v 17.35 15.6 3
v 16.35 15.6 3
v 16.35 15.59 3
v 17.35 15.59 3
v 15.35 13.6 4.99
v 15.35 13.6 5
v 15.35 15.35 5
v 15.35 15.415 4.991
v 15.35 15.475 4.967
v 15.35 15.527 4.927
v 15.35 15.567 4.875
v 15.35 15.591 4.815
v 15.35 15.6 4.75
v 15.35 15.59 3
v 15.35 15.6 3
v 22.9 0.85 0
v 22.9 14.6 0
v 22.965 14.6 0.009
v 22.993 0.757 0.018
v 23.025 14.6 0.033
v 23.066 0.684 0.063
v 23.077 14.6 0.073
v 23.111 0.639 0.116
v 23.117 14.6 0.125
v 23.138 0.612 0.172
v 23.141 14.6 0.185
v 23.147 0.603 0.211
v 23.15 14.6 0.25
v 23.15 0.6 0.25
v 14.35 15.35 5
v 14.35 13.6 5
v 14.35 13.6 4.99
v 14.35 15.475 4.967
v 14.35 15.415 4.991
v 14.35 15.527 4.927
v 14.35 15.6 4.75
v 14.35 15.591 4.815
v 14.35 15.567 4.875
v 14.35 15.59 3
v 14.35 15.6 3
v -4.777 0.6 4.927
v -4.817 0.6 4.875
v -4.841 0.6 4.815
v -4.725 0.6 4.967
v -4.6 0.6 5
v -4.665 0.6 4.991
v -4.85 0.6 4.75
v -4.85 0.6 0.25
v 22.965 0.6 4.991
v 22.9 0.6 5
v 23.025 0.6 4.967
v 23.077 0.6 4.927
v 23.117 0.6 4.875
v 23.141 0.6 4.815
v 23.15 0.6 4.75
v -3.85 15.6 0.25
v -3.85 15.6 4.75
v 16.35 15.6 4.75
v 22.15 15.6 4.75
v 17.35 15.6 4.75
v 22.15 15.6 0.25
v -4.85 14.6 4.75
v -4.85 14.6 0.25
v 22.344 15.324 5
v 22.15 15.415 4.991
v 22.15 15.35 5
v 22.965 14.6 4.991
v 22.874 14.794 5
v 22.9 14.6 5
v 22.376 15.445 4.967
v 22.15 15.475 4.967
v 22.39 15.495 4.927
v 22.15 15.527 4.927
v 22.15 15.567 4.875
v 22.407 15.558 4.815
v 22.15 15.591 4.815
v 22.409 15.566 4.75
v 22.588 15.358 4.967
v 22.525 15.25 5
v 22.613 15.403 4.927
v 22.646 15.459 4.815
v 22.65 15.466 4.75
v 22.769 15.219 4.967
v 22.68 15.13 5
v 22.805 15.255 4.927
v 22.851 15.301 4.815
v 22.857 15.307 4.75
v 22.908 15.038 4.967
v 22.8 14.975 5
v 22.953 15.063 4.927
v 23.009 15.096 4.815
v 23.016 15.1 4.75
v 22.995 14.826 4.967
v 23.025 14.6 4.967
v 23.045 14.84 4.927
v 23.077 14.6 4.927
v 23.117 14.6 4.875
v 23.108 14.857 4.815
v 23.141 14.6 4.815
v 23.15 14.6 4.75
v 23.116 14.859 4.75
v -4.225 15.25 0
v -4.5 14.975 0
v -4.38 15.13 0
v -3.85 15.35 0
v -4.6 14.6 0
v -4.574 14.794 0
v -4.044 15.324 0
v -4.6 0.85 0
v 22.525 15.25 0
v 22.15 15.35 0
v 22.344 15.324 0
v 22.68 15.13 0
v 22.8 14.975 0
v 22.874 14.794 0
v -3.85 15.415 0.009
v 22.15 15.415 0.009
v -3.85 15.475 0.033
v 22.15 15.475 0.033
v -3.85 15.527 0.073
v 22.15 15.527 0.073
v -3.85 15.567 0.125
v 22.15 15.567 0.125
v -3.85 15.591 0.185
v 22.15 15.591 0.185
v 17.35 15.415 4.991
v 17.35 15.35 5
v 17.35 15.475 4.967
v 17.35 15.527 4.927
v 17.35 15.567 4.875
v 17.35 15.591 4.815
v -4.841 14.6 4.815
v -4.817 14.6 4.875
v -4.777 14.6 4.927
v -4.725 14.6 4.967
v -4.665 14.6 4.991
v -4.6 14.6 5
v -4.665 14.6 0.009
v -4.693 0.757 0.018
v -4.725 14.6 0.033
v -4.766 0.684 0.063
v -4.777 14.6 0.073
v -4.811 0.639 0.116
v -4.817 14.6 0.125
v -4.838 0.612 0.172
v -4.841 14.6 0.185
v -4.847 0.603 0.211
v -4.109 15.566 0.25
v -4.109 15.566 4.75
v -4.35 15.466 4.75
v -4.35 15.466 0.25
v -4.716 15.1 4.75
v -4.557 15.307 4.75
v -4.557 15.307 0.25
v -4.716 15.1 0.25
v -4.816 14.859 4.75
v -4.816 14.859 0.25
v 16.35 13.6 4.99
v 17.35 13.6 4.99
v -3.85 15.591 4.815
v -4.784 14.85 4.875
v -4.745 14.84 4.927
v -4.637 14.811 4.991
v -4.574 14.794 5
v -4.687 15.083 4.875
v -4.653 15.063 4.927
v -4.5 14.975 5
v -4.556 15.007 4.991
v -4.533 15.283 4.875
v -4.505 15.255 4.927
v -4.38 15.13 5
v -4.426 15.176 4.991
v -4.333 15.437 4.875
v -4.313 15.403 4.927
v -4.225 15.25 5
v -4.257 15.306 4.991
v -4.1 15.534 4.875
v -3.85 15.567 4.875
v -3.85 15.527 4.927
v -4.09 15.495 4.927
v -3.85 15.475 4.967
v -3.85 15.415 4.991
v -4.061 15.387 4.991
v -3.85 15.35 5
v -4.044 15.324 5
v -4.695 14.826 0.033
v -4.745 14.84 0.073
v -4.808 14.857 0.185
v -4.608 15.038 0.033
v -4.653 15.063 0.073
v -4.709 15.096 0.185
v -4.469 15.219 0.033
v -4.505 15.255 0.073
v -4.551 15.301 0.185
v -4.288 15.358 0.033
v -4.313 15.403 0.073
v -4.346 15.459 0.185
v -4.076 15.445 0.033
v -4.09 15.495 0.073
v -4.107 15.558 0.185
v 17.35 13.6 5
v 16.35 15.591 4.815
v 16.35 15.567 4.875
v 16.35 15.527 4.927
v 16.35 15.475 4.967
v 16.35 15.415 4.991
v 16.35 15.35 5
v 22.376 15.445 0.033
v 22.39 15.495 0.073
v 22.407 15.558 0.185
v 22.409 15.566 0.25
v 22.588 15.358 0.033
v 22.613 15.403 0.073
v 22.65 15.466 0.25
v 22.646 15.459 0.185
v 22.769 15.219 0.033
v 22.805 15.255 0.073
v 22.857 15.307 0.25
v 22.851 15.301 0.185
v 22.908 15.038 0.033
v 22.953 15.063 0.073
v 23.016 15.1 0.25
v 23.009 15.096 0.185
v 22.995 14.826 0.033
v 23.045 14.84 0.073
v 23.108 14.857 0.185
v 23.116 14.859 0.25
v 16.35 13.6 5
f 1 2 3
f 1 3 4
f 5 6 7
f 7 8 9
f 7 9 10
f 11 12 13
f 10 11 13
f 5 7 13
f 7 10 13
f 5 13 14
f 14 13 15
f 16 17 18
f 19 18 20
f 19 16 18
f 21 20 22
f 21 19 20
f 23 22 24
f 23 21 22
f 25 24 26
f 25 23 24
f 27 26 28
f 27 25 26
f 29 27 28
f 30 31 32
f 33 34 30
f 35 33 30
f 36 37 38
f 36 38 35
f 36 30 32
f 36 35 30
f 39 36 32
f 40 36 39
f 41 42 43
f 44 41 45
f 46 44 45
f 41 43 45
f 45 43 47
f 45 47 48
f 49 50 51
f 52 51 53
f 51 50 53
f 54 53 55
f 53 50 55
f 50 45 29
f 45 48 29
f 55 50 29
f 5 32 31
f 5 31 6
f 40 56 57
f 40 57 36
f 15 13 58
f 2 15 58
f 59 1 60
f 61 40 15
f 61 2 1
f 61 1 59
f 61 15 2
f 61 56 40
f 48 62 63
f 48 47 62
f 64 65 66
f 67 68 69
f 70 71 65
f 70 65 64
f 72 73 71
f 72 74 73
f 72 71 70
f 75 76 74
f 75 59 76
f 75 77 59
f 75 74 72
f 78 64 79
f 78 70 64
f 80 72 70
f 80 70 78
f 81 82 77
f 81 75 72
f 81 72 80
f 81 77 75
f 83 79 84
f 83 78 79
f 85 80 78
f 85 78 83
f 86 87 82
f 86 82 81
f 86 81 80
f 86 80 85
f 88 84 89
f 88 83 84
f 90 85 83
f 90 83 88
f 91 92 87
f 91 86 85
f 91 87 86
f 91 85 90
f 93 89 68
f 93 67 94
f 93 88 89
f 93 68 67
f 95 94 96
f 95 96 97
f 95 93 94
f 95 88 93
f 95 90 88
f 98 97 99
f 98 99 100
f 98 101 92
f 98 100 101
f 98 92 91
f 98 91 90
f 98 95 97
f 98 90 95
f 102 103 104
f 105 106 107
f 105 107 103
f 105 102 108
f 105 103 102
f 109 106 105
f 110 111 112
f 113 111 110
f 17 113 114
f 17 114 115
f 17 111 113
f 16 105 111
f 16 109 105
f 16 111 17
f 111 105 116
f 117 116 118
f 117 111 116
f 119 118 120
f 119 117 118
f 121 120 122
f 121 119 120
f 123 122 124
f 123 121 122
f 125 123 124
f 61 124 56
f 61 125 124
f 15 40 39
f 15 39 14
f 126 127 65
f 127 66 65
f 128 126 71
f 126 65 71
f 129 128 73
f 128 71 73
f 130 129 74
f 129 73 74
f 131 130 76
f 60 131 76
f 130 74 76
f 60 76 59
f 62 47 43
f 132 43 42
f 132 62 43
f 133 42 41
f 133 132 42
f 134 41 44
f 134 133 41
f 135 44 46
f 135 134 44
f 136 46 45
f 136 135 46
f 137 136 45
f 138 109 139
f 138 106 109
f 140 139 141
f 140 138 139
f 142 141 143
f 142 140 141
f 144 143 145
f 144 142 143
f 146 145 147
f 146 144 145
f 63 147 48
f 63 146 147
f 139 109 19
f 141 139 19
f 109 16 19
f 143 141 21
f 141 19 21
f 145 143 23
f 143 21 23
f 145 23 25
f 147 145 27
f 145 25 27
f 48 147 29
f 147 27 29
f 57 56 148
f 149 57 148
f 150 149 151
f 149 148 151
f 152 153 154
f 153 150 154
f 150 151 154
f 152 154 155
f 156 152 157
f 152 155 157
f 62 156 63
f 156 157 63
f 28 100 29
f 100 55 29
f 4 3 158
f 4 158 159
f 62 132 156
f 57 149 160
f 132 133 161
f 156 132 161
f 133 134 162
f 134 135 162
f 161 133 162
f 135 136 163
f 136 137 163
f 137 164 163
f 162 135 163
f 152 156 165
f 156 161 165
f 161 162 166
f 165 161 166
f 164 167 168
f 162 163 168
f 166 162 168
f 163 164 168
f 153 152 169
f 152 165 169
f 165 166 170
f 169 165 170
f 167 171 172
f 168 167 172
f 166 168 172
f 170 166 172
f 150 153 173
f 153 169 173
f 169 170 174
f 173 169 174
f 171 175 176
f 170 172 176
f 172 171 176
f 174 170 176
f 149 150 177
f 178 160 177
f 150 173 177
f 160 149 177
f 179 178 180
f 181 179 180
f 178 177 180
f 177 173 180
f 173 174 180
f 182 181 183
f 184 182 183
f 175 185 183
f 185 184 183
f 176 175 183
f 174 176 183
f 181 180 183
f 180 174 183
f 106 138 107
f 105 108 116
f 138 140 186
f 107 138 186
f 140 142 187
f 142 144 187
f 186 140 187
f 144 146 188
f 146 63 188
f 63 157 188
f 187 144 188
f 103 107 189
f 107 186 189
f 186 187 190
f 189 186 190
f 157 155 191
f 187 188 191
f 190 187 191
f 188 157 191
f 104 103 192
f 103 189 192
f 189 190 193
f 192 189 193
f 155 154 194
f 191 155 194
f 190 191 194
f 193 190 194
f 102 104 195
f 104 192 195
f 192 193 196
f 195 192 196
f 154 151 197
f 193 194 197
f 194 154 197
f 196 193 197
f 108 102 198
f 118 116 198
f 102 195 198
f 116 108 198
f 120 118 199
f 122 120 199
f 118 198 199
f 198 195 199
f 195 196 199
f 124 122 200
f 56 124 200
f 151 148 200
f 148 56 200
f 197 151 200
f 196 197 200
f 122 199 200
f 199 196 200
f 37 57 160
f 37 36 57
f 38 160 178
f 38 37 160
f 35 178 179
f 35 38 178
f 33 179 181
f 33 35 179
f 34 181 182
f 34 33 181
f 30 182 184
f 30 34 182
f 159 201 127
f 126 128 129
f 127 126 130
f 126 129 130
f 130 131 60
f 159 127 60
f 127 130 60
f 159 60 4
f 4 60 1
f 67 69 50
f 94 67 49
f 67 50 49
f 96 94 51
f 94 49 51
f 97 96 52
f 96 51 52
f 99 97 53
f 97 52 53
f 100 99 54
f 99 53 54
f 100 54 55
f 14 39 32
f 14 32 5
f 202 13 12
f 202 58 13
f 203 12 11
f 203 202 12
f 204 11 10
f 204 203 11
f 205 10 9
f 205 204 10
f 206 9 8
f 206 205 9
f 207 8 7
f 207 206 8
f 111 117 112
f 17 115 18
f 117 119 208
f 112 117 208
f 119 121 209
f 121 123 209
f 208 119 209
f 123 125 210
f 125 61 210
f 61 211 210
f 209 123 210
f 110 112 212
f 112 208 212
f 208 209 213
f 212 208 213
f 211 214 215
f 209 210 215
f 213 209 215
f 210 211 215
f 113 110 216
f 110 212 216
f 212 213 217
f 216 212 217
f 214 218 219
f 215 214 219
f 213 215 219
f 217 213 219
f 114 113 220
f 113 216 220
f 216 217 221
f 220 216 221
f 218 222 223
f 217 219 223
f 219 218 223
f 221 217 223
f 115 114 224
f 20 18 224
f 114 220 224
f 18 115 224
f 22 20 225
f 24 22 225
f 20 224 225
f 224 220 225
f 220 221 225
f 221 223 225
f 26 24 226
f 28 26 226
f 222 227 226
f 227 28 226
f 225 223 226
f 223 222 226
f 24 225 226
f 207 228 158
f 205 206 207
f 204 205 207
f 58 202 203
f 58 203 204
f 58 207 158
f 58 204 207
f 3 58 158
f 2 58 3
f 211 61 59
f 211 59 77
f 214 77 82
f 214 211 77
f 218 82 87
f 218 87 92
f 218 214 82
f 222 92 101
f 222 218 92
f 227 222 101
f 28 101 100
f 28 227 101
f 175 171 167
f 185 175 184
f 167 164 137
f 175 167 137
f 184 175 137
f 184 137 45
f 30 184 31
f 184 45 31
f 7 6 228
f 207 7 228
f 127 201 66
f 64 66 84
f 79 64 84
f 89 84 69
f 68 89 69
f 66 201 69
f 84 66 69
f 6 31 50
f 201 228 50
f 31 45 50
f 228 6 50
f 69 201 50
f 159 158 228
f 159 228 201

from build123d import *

# Parameters (mm, degrees)
SKETCH001_W  = 28
SKETCH001_H  = 5
PAD001_DEPTH = 15
SKETCH002_W  = 1
SKETCH002_H  = 2
POCKET_DEPTH = 2
CHAMFER_SIZE = 1.99
FILLET_R     = 1
FILLET001_R  = 0.25
FILLET002_R  = 0.25


with BuildPart() as part:
    # Sketch001 → Pad001 (new body)
    with BuildSketch(Plane(origin=(-3.75, 0.6, 1.3), x_dir=(1, 0, 0), z_dir=(0, 1, 0))):
        with Locations((12.9, -1.2)):
            Rectangle(SKETCH001_W, SKETCH001_H)
    extrude(amount=PAD001_DEPTH)

    # Sketch002 → Pocket (cut)
    with BuildSketch(Plane(origin=(-3.75, 15.6, 1.3), x_dir=(1, 0, 0), z_dir=(0, 1, 0))):
        with Locations((18.6, -2.7)):
            Rectangle(SKETCH002_W, SKETCH002_H)
        with Locations((20.6, -2.7)):
            Rectangle(SKETCH002_W, SKETCH002_H)
    extrude(amount=-POCKET_DEPTH, mode=Mode.SUBTRACT)

    # Chamfer
    chamfer_edges = [part.edges().sort_by_distance(p)[0] for p in [
        (16.85, 13.6, 3),
        (14.85, 13.6, 3),
    ]]
    chamfer(chamfer_edges, length=CHAMFER_SIZE)

    # Fillet
    fillet_edges = [part.edges().sort_by_distance(p)[0] for p in [
        (-4.85, 15.6, 2.5),
        (23.15, 15.6, 2.5),
    ]]
    fillet(fillet_edges, radius=FILLET_R)

    # Fillet001
    fillet001_edges = [part.edges().sort_by_distance(p)[0] for p in [
        (-4.85, 7.6, 0),
        (-4.557107, 15.307107, 0),
        (9.15, 0.6, 0),
        (9.15, 15.6, 0),
        (23.15, 7.6, 0),
        (22.857107, 15.307107, 0),
    ]]
    fillet(fillet001_edges, radius=FILLET001_R)

    # Fillet002
    fillet002_edges = [part.edges().sort_by_distance(p)[0] for p in [
        (22.857107, 15.307107, 5),
        (23.15, 7.6, 5),
        (19.75, 15.6, 5),
        (15.85, 15.6, 5),
        (5.25, 15.6, 5),
        (-4.557107, 15.307107, 5),
        (-4.85, 7.6, 5),
    ]]
    fillet(fillet002_edges, radius=FILLET002_R)


solid = part.part
